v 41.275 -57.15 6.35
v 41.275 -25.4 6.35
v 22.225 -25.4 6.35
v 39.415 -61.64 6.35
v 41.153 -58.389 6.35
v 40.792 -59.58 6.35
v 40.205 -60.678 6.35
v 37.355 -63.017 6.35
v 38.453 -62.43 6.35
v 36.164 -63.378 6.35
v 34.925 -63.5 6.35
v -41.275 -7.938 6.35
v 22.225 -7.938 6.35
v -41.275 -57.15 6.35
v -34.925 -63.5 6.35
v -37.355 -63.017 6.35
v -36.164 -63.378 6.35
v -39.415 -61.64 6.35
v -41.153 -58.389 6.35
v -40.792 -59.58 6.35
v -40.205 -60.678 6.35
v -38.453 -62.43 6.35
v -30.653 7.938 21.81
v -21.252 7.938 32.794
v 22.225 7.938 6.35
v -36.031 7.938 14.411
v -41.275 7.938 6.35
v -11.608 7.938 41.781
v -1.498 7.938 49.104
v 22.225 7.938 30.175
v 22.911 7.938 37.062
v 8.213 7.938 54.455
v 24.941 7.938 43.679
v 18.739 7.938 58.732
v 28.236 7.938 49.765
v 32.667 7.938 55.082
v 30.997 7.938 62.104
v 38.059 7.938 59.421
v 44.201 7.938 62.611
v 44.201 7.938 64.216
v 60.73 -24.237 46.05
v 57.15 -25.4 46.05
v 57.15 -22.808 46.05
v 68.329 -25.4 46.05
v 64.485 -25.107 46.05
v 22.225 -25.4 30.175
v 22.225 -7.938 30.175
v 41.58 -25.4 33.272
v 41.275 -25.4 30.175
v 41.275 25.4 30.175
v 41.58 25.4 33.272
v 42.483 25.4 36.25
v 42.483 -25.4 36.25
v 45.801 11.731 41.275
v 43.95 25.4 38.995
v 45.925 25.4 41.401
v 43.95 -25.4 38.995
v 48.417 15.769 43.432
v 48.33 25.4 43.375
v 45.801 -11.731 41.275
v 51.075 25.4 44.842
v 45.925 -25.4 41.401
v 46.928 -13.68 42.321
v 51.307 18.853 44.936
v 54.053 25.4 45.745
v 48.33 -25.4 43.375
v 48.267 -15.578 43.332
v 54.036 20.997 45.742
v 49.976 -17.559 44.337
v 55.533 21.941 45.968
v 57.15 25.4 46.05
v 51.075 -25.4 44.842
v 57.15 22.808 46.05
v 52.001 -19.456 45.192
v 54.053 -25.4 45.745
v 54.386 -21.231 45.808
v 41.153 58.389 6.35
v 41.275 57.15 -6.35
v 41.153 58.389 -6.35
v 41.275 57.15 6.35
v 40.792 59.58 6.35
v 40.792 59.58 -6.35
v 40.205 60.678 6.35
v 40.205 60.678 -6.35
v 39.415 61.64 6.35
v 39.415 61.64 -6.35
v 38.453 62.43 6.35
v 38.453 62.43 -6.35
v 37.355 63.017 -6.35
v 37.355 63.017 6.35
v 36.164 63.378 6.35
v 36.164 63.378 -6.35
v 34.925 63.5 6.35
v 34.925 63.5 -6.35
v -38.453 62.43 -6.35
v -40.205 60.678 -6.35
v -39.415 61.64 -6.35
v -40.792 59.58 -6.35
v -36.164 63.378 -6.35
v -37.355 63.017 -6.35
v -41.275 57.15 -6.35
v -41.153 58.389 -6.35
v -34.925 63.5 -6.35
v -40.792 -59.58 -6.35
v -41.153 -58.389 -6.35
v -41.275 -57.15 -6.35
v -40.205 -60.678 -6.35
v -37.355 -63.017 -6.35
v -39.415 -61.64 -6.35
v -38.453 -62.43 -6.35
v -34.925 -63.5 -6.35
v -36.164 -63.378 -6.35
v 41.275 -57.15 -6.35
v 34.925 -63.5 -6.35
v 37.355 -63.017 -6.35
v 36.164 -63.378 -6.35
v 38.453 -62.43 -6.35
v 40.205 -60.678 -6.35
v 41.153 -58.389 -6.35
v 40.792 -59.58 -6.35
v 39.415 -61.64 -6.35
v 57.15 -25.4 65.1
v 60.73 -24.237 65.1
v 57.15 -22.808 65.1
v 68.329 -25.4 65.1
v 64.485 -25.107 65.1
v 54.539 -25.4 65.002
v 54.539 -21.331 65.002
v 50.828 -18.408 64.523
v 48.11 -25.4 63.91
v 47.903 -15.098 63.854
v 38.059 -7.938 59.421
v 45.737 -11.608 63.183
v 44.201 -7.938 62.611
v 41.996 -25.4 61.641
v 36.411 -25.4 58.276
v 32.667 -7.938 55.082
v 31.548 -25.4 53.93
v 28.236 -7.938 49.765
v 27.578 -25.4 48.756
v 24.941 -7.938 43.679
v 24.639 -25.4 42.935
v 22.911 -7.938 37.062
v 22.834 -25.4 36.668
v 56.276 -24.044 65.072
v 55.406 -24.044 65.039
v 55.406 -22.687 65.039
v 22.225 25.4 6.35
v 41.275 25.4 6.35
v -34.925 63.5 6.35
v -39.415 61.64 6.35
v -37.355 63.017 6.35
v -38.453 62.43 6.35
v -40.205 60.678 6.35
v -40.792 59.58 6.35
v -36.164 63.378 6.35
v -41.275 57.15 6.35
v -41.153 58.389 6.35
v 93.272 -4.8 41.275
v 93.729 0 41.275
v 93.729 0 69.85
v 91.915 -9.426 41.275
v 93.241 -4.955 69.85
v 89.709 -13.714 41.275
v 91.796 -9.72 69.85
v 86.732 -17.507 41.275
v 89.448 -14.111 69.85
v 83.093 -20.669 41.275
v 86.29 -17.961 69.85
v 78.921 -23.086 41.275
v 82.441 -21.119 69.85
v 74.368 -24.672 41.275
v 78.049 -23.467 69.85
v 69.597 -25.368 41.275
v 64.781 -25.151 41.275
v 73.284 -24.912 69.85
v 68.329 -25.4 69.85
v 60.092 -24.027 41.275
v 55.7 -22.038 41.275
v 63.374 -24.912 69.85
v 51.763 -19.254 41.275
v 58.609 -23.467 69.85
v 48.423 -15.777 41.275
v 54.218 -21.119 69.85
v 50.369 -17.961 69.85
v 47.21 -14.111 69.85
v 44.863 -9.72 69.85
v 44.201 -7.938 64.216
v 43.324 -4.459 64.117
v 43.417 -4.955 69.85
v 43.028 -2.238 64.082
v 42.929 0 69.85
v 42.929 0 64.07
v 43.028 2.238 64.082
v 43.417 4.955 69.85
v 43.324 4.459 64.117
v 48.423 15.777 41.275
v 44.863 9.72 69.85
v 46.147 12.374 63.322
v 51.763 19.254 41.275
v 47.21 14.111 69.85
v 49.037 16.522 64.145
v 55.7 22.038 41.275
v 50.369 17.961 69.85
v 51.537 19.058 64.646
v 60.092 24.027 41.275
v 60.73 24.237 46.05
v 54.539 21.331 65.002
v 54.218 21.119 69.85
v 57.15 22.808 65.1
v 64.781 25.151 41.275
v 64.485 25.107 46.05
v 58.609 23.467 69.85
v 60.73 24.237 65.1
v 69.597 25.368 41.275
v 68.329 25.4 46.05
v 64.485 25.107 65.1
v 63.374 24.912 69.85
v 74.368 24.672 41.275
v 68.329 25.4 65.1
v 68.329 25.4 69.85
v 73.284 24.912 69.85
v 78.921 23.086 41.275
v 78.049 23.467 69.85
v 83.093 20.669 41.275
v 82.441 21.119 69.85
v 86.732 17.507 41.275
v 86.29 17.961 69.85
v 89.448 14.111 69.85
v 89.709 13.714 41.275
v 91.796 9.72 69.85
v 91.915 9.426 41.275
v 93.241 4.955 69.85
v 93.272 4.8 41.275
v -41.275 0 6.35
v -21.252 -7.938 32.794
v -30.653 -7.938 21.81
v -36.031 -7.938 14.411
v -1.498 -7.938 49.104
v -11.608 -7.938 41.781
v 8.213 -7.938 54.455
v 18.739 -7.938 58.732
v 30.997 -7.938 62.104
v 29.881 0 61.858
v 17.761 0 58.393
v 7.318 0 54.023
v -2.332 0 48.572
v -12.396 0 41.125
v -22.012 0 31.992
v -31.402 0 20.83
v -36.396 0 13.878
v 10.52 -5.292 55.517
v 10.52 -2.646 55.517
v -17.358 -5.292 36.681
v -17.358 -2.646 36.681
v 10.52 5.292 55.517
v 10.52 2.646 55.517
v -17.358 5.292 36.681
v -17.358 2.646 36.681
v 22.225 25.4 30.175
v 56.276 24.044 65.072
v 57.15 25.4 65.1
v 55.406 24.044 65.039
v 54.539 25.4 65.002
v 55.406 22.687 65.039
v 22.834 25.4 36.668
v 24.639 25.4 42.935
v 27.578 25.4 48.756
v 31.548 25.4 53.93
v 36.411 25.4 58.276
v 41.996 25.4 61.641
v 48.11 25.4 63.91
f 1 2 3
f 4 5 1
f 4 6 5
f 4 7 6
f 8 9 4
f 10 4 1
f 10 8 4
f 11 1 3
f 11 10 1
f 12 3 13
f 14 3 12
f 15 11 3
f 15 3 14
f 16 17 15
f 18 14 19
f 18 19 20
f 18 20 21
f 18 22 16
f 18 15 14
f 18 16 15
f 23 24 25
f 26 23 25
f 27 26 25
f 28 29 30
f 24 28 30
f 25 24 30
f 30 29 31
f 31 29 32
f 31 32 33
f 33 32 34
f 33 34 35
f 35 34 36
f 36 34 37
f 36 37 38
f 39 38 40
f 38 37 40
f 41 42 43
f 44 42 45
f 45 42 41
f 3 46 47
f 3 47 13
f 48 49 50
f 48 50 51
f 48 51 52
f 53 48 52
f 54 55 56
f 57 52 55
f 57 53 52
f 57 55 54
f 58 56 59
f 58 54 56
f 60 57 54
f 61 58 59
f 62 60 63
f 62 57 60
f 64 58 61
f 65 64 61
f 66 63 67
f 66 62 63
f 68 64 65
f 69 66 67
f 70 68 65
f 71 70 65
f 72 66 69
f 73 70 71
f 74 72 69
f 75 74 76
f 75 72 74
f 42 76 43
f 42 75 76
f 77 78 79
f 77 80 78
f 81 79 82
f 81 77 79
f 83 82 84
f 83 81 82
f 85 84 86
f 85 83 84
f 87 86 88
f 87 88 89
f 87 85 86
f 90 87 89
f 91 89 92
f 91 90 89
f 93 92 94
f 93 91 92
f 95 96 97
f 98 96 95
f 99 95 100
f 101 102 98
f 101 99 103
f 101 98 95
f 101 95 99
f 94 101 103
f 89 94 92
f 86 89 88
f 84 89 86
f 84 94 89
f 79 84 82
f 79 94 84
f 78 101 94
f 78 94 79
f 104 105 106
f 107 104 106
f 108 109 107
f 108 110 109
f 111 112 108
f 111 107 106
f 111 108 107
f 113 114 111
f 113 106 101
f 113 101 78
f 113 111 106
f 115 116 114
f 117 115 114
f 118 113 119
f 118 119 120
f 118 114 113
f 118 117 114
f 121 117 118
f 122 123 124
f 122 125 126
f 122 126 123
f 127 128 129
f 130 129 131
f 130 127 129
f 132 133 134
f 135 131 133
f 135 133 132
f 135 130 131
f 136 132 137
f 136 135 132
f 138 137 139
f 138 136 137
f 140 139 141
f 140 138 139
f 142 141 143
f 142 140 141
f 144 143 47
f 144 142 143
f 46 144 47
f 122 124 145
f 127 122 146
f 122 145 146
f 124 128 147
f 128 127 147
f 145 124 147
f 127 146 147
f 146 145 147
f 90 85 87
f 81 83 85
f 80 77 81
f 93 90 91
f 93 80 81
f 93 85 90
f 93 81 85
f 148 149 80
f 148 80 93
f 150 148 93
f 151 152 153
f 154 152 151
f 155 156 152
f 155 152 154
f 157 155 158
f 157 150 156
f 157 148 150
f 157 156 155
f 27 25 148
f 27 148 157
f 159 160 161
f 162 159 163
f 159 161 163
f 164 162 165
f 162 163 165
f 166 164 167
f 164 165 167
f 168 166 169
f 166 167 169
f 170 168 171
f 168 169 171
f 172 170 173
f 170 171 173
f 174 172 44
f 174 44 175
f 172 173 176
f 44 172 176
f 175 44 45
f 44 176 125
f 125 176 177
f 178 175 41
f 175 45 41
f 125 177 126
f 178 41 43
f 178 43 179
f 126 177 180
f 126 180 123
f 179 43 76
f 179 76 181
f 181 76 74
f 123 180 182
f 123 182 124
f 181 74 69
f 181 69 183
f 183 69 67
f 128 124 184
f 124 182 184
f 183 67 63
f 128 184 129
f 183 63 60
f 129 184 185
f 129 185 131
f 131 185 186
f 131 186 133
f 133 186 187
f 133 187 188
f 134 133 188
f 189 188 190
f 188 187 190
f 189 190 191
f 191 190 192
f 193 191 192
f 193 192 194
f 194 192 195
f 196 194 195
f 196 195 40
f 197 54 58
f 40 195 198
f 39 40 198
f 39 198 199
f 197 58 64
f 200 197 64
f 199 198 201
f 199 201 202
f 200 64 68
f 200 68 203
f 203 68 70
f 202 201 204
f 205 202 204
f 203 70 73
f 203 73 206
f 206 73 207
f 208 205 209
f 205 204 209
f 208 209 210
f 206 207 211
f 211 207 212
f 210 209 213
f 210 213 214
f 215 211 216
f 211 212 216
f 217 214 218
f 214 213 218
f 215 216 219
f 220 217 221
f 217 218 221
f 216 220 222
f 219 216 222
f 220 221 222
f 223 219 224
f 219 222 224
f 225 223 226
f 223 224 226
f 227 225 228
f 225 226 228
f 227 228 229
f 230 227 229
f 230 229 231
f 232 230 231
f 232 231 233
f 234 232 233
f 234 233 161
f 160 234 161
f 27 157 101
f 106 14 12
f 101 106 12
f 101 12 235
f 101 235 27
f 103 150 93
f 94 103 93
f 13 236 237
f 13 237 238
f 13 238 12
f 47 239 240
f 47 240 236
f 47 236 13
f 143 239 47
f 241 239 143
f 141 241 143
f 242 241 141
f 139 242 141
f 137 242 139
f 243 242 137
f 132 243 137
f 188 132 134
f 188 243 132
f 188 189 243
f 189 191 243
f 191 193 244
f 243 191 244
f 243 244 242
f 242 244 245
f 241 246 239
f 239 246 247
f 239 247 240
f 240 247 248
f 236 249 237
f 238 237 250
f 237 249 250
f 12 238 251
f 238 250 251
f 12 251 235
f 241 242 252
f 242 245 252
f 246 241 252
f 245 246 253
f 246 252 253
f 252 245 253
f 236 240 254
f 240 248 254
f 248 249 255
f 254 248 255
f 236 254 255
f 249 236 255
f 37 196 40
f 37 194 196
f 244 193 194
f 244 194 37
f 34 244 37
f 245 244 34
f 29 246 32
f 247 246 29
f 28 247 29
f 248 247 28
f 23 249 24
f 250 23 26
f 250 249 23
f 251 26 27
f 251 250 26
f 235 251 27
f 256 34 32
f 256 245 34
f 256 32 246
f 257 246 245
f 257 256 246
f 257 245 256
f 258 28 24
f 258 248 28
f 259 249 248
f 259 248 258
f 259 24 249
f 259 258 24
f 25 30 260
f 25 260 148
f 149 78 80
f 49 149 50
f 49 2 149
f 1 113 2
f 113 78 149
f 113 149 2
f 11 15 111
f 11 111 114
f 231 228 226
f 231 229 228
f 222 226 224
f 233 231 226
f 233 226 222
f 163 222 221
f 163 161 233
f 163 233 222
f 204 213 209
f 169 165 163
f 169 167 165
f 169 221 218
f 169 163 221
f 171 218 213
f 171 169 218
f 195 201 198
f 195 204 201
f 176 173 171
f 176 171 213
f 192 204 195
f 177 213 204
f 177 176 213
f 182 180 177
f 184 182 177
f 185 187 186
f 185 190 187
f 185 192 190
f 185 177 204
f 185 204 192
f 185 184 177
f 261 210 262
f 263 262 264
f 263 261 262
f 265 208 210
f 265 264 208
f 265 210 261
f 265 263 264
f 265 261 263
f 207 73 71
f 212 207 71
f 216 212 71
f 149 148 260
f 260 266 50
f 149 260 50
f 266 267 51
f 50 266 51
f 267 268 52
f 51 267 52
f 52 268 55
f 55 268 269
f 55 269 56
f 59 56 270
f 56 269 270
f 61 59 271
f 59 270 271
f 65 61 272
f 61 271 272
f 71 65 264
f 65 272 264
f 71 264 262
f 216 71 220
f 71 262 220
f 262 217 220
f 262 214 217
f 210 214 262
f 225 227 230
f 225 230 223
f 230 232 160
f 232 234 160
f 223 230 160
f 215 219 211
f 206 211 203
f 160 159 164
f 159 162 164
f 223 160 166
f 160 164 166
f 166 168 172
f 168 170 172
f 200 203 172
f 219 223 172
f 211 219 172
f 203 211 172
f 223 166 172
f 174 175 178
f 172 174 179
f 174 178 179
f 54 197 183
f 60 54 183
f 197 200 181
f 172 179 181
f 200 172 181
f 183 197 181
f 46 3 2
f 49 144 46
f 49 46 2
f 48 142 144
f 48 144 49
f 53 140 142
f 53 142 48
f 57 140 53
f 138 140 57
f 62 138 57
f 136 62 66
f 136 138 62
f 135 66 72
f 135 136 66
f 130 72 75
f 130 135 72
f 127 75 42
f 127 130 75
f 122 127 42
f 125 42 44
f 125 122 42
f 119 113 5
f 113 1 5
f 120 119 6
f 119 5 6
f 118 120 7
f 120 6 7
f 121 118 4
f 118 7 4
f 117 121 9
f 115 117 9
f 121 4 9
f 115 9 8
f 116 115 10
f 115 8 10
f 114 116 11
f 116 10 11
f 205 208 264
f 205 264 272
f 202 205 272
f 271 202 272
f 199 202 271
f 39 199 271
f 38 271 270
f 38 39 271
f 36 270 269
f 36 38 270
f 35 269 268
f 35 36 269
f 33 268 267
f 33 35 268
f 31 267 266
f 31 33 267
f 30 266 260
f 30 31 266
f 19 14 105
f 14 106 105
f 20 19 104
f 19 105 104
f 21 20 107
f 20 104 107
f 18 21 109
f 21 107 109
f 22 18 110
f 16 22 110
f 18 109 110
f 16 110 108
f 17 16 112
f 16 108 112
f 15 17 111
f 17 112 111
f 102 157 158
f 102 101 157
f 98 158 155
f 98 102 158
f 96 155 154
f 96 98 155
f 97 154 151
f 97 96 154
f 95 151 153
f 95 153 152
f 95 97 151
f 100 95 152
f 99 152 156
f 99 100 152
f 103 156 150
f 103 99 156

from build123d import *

# Parameters (mm, degrees)
F1_DEPTH = 63.5
F2_DEPTH = 25.4
F3_DEPTH = 7.9375
F0_W     = 25.4
F0_H     = 19.05
F0_H_2   = 4.7752
F0_H_3   = 4.7498
F5_R     = 6.35


with BuildPart() as f1:
    # F0 (on Front) → F1 (new body, symmetric)
    with BuildSketch(Plane.XZ):
        Polygon((41.275, -6.35), (41.275, 6.35), (22.225, 6.35), (-41.275, 6.35), (-41.275, -6.35), align=None)
    extrude(amount=F1_DEPTH, both=True)

    # F0 (on Front) → F2 (join, symmetric)
    with BuildSketch(Plane.XZ):
        with BuildLine():
            Line((22.225, 6.35), (41.275, 6.35))
            Line((41.275, 6.35), (41.275, 30.1752))
            ThreePointArc((41.275, 30.1752), (45.9246798487, 41.4005201513), (57.15, 46.0502))
            Line((57.15, 46.0502), (68.3291607261, 46.0502))
            Line((68.3291607261, 46.0502), (68.3291607261, 65.1002))
            Line((68.3291607261, 65.1002), (57.15, 65.1002))
            add(Edge.make_bspline(
                [(57.15, 65.1002), (56.2738590878, 65.0736826773), (55.4037055369, 65.041136828), (54.5394513338, 65.0024976365)],
                knots=[0, 0, 0, 0, 2.264919631, 2.264919631, 2.264919631, 2.264919631], degree=3))
            ThreePointArc((54.5394513338, 65.0024976365), (31.5479587028, 53.9300122791), (22.225, 30.1752))
            Line((22.225, 30.1752), (22.225, 6.35))
        make_face()
    extrude(amount=F2_DEPTH, both=True)

    # F0 (on Front) → F3 (join, symmetric)
    with BuildSketch(Plane.XZ):
        with BuildLine():
            Line((-41.275, 6.35), (22.225, 6.35))
            Line((22.225, 6.35), (22.225, 30.1752))
            ThreePointArc((22.225, 30.1752), (31.5479587028, 53.9300122791), (54.5394513338, 65.0024976365))
            add(Edge.make_bspline(
                [(54.5394513338, 65.0024976365), (11.6644928166, 63.085638308), (-16.6917426365, 46.172621582), (-41.275, 6.35)],
                knots=[2.264919631, 2.264919631, 2.264919631, 2.264919631, 114.6257677184, 114.6257677184, 114.6257677184, 114.6257677184], degree=3))
        make_face()
    extrude(amount=F3_DEPTH, both=True)

    # F0 (on Front) → F4 (revolve)
    with BuildSketch(Plane.XZ):
        with Locations((81.0291607261, 55.5752)):
            Rectangle(F0_W, F0_H)
        with Locations((81.0291607261, 43.6626)):
            Rectangle(F0_W, F0_H_2)
        with Locations((81.0291607261, 67.4751)):
            Rectangle(F0_W, F0_H_3)
    revolve(axis=Axis((68.3291607261, 0, 55.5625), (0, 0, -1)))

    # F5
    f5_edges = [f1.edges().sort_by_distance(p)[0] for p in [
        (41.275, -63.5, 0),
        (41.275, 63.5, 0),
        (-41.275, -63.5, 0),
        (-41.275, 63.5, 0),
    ]]
    fillet(f5_edges, radius=F5_R)


solid = f1.part
